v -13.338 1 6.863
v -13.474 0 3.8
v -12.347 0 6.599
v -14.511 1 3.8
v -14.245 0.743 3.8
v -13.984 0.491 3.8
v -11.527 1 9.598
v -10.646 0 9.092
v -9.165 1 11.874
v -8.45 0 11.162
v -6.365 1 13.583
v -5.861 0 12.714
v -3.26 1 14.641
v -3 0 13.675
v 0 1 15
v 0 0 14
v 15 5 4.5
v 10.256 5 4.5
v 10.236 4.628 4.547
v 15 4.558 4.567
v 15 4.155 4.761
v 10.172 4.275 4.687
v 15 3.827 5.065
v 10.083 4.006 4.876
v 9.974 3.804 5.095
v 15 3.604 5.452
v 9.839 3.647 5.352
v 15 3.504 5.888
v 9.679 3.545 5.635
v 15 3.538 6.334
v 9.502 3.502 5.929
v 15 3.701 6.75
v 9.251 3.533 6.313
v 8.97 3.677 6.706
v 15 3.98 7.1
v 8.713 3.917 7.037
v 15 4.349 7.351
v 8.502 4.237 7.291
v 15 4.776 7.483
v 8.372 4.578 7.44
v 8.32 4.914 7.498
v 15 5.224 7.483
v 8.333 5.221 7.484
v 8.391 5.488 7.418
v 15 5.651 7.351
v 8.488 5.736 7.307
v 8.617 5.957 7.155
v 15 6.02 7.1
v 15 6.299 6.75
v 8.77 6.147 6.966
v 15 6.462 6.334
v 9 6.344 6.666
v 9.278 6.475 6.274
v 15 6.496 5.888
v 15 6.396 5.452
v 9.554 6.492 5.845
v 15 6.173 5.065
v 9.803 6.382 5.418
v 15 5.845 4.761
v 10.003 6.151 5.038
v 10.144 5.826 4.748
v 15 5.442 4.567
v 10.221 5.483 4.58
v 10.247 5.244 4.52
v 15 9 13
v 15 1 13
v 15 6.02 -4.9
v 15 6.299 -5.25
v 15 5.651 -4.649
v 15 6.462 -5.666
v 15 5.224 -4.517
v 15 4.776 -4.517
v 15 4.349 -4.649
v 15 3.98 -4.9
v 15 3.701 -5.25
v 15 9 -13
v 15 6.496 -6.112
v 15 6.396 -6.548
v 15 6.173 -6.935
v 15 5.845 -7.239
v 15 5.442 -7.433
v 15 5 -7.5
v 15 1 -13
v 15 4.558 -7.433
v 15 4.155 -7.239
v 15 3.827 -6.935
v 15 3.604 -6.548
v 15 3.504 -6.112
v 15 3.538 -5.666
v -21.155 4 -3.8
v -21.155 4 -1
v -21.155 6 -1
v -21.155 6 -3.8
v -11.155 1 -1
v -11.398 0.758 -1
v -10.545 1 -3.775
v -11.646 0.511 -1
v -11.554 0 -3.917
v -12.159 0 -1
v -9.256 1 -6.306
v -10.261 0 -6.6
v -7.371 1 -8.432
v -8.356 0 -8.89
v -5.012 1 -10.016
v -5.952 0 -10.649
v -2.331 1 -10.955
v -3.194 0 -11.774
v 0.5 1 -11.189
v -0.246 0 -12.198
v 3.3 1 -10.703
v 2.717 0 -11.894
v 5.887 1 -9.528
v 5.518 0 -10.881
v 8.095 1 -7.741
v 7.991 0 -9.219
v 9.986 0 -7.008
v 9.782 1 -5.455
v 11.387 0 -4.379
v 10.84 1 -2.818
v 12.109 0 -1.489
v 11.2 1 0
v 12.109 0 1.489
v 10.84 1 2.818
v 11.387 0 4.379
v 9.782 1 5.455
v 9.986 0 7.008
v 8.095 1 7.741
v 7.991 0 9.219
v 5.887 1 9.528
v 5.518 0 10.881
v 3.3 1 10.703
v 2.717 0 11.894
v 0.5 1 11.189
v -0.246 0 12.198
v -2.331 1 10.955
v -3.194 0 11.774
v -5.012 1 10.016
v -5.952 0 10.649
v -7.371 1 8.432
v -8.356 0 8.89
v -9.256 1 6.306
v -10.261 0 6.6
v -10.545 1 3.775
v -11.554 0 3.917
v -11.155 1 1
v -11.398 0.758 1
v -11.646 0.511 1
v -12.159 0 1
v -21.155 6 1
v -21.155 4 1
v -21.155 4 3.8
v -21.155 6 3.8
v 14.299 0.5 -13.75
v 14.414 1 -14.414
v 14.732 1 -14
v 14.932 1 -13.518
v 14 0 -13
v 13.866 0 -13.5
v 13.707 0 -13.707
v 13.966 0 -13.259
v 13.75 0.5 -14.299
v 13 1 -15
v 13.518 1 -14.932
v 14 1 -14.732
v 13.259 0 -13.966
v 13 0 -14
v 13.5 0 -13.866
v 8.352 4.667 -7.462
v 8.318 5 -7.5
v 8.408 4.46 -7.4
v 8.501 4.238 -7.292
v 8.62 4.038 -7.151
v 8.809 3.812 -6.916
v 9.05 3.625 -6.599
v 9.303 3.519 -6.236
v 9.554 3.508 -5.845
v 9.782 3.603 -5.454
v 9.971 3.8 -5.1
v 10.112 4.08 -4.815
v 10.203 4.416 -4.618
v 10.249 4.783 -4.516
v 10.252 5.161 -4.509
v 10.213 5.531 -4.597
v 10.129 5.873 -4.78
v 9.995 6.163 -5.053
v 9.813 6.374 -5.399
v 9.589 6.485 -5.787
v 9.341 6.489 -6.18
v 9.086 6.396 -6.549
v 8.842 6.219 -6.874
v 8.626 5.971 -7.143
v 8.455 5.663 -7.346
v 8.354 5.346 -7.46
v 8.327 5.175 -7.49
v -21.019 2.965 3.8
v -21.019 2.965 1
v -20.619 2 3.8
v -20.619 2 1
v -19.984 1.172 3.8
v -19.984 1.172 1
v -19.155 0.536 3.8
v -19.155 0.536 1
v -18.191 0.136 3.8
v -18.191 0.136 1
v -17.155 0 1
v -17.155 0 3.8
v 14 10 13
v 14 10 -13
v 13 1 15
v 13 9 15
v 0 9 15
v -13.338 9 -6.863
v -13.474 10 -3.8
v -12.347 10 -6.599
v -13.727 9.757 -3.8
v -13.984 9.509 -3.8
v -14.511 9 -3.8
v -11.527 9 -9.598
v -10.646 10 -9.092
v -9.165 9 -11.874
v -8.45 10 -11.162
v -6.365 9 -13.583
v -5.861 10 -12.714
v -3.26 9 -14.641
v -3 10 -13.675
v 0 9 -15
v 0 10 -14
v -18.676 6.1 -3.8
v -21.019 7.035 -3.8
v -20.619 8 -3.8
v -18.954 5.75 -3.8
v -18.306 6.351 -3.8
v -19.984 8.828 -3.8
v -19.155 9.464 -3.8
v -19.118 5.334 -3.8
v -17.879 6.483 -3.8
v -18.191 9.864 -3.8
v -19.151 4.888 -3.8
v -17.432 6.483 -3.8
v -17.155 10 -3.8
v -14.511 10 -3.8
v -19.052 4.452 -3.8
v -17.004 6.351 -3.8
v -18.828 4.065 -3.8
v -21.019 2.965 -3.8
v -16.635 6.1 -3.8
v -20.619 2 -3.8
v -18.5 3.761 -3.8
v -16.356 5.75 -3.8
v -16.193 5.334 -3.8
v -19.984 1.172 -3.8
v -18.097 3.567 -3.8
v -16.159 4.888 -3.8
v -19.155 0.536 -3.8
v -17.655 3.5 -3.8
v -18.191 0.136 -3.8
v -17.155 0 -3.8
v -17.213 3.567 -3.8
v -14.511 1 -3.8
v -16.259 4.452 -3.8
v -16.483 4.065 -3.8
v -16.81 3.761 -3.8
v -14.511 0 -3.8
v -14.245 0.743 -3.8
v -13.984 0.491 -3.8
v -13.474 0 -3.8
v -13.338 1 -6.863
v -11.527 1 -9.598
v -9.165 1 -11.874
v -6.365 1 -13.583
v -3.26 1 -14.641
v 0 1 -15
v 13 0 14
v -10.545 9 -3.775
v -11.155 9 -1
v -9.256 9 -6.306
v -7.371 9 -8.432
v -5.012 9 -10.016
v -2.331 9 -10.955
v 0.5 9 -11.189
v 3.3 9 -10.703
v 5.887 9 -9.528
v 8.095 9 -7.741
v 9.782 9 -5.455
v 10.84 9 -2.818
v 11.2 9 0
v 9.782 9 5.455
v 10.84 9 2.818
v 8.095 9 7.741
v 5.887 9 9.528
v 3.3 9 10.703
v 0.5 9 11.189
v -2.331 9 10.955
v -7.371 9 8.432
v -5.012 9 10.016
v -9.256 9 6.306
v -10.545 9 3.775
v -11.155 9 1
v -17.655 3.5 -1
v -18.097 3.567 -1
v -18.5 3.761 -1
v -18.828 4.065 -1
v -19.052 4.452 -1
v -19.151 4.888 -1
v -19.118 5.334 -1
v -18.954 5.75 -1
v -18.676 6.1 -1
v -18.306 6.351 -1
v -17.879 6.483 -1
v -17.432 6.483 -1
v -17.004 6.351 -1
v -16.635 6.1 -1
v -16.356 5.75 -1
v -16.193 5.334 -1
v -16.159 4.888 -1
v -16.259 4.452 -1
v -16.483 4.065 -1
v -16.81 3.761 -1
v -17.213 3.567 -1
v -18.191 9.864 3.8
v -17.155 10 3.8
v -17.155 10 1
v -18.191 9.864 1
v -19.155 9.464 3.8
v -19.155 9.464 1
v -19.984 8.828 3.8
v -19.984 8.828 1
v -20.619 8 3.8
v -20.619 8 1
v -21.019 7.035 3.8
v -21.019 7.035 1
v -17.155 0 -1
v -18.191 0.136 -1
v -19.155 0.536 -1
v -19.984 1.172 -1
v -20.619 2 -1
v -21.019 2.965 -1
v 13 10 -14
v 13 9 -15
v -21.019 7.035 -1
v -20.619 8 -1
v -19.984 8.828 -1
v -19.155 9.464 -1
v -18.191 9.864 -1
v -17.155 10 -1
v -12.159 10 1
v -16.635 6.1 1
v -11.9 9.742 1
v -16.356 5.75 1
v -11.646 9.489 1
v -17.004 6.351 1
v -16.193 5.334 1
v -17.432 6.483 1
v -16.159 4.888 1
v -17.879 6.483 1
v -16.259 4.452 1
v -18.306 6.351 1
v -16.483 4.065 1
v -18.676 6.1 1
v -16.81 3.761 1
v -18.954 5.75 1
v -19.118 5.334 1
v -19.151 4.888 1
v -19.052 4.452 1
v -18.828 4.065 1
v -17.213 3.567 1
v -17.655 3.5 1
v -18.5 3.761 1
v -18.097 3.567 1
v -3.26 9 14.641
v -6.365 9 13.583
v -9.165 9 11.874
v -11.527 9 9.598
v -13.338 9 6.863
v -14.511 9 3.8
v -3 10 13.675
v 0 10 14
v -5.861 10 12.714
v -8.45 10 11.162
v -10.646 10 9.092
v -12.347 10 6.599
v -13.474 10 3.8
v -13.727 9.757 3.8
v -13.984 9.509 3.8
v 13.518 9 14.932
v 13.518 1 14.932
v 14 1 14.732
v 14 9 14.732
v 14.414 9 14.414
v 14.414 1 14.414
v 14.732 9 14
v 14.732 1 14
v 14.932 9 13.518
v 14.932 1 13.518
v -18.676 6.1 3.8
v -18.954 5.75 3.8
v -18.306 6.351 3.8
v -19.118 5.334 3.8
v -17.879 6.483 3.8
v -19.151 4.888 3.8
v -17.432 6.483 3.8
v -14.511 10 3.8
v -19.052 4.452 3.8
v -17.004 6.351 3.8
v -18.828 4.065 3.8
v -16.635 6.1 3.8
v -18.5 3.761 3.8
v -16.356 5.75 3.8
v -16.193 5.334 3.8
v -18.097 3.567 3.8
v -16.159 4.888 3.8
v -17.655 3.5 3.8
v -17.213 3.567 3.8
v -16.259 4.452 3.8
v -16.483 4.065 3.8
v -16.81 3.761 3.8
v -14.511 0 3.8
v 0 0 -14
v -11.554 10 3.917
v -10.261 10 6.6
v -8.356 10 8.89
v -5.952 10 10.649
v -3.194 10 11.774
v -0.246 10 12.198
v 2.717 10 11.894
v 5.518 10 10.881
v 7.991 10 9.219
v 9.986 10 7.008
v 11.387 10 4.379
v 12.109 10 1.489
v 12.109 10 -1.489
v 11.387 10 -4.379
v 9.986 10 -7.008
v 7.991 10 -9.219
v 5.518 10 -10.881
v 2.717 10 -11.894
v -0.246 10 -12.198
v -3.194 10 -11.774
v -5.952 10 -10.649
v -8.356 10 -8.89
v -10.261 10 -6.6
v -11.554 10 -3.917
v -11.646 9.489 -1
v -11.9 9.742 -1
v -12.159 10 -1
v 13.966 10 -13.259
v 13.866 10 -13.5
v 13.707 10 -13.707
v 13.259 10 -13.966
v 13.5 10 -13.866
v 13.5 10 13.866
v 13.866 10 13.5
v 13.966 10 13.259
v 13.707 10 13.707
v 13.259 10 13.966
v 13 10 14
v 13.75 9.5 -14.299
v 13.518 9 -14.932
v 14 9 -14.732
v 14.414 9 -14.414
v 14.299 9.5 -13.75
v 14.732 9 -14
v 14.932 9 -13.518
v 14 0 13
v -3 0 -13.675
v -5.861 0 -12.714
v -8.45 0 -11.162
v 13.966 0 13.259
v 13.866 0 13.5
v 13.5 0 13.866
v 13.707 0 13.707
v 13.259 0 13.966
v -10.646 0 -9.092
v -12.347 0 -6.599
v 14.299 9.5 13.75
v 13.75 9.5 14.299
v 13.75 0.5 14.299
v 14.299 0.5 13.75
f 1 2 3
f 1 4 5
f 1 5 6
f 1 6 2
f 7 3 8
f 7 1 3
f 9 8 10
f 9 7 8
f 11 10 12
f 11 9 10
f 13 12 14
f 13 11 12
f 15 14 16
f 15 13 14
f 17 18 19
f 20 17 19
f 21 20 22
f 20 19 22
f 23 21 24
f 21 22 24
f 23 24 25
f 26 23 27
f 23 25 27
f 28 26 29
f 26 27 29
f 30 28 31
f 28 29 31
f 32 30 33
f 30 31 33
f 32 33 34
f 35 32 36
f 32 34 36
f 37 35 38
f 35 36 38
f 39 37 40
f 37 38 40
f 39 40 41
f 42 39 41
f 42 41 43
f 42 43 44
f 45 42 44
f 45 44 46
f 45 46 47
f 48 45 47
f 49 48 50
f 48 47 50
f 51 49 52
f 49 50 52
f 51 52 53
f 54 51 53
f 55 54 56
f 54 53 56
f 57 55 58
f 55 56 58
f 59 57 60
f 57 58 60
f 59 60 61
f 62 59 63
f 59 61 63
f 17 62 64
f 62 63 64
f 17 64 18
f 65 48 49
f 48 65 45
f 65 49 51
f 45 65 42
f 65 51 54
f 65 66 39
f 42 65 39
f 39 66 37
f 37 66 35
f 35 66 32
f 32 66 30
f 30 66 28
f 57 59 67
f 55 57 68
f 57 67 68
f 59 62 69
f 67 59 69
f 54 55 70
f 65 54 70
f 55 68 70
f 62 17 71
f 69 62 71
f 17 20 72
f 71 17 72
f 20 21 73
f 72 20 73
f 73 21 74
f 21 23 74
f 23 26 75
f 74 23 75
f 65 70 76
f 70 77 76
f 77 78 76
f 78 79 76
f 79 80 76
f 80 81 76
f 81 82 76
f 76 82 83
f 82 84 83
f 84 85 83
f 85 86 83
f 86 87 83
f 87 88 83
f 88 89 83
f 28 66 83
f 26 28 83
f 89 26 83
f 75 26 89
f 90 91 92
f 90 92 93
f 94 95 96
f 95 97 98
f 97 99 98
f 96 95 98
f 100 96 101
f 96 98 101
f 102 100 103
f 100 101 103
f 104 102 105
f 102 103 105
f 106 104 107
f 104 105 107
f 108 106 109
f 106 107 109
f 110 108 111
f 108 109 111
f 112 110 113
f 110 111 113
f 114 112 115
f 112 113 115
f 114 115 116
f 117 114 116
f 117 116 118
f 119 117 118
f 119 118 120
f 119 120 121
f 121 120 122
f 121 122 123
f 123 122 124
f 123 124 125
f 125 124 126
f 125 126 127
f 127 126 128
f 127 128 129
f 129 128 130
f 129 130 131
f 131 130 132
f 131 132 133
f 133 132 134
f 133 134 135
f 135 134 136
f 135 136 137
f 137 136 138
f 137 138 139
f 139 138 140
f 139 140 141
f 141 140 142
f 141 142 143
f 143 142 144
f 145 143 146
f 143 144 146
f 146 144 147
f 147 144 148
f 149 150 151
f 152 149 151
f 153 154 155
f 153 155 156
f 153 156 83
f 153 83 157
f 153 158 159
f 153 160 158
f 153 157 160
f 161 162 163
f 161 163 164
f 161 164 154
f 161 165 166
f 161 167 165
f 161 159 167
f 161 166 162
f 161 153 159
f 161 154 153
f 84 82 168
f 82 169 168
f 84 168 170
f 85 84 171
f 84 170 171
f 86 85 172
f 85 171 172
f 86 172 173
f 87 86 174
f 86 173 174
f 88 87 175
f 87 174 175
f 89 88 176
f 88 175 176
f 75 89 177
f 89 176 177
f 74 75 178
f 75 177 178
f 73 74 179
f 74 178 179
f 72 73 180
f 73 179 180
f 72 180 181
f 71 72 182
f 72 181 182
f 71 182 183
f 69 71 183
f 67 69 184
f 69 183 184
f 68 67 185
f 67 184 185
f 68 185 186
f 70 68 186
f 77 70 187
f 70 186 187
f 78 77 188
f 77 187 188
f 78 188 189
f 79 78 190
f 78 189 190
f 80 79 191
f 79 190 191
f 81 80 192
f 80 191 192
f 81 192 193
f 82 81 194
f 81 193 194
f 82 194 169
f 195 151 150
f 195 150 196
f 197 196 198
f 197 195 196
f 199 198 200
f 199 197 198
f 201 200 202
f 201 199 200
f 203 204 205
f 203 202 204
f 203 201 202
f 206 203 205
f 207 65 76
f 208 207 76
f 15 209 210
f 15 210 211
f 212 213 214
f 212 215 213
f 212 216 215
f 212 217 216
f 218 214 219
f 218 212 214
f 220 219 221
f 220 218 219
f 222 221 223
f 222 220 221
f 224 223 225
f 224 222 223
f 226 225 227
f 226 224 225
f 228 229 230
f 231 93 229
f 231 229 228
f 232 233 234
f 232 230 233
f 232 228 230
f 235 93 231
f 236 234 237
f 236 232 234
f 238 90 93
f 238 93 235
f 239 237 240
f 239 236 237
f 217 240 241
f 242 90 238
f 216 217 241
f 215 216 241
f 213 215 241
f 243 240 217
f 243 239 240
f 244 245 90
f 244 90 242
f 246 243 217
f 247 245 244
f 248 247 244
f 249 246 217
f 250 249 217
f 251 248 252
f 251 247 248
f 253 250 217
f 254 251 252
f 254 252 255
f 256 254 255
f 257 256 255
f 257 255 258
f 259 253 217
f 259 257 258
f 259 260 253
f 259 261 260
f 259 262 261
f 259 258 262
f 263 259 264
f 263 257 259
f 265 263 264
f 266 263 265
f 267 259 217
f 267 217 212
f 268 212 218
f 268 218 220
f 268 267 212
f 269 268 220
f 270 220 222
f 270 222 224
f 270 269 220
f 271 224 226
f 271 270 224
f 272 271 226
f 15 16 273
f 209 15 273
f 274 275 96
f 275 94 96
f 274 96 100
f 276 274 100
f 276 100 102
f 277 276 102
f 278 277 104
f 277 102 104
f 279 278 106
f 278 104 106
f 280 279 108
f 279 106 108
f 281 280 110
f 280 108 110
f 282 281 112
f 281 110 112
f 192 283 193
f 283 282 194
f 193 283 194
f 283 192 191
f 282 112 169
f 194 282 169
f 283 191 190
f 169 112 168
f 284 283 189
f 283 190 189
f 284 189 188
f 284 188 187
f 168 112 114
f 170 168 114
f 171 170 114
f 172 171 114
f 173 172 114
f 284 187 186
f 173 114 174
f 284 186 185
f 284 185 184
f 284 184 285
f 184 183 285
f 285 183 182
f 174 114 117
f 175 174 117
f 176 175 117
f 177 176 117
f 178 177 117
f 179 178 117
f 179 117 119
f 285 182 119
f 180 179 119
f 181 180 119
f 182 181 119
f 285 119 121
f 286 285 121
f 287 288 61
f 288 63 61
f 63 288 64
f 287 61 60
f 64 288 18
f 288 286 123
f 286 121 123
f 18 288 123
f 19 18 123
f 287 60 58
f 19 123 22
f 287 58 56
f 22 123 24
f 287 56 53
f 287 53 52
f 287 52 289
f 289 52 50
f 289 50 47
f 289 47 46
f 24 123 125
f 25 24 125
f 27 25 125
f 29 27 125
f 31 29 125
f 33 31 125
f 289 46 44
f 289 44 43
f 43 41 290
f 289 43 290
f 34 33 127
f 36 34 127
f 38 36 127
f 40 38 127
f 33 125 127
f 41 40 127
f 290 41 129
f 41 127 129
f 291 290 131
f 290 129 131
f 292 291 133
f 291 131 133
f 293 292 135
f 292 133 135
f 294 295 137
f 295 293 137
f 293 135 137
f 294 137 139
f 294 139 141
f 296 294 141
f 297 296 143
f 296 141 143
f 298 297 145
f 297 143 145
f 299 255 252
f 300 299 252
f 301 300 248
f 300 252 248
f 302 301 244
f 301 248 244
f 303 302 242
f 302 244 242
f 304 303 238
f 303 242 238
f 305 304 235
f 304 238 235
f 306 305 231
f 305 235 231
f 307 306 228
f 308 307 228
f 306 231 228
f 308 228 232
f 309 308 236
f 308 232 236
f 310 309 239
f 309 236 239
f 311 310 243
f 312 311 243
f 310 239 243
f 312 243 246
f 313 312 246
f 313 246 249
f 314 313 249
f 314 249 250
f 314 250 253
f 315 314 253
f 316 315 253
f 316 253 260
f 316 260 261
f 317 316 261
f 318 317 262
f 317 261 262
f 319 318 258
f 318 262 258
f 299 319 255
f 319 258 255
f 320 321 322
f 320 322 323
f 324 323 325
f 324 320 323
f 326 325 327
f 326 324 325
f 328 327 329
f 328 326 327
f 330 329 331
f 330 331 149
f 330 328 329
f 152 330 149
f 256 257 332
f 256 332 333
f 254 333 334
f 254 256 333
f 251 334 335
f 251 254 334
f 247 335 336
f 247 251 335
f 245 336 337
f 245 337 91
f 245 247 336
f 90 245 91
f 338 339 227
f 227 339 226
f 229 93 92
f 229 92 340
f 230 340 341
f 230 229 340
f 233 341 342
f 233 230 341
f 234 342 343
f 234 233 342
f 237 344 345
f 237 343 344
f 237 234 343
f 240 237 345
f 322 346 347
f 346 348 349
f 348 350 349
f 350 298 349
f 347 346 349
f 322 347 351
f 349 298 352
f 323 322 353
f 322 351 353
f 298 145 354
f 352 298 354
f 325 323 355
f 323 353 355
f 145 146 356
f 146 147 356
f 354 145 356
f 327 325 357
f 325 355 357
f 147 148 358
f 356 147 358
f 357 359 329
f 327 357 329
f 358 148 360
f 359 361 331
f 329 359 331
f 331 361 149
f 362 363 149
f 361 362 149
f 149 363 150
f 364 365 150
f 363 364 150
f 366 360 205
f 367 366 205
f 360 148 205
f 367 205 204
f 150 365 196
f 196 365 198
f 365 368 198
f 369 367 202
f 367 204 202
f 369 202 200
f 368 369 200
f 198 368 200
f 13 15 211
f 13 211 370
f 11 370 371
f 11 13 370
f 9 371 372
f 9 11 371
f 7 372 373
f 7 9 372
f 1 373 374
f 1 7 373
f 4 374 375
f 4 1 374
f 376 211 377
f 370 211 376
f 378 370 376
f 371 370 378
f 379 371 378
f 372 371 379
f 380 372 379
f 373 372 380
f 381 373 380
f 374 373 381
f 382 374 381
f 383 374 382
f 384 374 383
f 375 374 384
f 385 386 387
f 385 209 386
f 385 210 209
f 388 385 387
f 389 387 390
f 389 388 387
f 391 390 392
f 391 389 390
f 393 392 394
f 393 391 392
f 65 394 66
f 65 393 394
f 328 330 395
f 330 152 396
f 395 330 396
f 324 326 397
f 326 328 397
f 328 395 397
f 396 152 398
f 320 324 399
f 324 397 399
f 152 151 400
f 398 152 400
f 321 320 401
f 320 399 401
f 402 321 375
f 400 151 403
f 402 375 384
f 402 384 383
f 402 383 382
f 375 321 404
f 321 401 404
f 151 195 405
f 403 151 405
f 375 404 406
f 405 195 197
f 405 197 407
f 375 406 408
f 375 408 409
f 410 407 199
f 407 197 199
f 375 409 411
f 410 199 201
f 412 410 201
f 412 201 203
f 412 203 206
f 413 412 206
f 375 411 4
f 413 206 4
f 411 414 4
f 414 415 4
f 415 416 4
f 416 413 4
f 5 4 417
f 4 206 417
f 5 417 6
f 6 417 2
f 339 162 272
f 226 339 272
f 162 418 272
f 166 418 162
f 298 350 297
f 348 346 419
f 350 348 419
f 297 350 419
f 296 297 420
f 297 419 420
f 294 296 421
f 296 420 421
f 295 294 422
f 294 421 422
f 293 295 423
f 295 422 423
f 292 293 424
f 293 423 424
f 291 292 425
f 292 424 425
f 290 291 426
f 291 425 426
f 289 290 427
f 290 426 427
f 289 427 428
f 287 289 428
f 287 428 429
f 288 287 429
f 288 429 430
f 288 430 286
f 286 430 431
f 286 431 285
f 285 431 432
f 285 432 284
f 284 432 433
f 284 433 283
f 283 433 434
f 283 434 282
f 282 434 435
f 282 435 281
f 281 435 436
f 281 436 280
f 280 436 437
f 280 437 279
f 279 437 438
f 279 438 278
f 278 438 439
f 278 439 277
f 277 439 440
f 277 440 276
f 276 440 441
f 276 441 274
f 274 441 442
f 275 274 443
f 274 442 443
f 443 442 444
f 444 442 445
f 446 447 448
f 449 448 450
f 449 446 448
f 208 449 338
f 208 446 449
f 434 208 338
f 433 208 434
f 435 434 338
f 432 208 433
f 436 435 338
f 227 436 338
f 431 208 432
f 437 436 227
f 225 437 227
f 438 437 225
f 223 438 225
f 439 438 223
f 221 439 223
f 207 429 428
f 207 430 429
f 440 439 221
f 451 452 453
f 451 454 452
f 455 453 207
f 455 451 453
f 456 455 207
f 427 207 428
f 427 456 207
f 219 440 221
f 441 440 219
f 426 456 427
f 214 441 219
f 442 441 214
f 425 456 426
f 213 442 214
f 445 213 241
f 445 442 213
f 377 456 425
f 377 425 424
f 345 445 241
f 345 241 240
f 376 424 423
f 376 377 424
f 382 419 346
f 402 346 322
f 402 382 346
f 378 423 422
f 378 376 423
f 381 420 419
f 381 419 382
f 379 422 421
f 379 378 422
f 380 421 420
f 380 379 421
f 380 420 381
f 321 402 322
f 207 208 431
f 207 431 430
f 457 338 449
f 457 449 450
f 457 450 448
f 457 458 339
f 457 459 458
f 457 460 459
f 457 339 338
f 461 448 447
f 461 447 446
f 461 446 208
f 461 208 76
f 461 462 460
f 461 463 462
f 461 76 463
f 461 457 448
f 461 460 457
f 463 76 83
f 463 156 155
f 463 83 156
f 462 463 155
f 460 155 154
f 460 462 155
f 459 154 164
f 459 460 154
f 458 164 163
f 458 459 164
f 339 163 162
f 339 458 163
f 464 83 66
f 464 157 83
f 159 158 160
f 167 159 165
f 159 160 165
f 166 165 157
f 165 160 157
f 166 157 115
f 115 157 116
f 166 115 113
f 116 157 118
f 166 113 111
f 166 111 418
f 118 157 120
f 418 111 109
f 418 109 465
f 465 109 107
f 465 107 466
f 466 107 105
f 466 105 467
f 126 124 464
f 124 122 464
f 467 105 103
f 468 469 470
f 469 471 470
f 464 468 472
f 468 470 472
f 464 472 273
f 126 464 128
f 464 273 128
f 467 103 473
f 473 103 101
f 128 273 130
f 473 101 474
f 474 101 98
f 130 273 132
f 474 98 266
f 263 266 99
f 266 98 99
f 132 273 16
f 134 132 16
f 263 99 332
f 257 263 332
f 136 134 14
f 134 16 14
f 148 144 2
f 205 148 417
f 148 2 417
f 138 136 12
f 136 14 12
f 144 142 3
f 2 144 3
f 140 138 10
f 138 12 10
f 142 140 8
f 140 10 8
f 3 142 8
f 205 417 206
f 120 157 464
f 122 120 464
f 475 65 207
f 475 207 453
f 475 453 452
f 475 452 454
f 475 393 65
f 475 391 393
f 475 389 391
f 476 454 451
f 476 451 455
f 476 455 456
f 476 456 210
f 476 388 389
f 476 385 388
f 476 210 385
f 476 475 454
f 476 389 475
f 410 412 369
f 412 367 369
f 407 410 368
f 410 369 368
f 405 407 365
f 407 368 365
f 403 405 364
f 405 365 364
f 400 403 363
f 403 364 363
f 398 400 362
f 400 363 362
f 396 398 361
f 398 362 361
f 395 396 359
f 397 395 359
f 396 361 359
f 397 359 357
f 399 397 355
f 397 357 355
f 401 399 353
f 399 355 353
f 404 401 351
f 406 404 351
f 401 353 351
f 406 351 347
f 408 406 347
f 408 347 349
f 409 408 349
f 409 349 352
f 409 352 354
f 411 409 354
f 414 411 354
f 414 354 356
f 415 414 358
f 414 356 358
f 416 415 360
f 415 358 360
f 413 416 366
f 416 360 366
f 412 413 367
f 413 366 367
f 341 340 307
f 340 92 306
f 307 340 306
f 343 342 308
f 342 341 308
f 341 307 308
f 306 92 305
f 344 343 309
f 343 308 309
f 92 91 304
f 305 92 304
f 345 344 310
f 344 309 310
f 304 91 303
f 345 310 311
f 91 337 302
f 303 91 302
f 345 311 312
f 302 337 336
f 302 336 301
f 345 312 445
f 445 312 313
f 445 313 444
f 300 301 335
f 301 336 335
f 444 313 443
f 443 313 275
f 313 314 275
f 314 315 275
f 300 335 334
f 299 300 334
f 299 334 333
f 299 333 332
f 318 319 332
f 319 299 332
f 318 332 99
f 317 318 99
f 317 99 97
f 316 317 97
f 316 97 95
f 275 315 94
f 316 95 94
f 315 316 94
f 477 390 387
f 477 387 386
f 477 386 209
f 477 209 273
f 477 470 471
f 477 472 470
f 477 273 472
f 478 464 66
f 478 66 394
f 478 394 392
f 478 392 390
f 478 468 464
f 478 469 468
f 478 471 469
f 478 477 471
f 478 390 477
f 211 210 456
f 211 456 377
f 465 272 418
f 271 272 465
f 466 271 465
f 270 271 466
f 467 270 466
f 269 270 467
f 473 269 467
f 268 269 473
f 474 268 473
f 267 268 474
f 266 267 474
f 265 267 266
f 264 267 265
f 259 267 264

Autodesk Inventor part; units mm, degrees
ref_plane "YZ Plane" through (0, 0, 0) normal (1, 0, 0) x (0, 1, 0)
ref_plane "XZ Plane" through (0, 0, 0) normal (0, 1, 0) x (-1, 0, 0)
ref_plane "XY Plane" through (0, 0, 0) normal (0, 0, 1) x (1, 0, 0)
sketch "Эскиз1" plane through (0, 0, 0) normal (0, 1, 0) x (-1, 0, 0)
  arc A0 (11.1553, 1) -> (11.1553, -1) centre (0, 0) ccw
  line L0 (-15, 15) -> (-15, -15)
  line L1 (-15, 15) -> (0, 15)
  line L2 (-15, -15) -> (0, -15)
  line L3 (11.1553, 1) -> (14.9666, 1)
  line L4 (14.9666, -1) -> (11.1553, -1)
  arc A1 (0, -15) -> (14.5107, -3.8) centre (0, 0) ccw
  arc A2 (14.5107, 3.8) -> (0, 15) centre (0, 0) ccw
  line L5 (11.1553, -1) -> (21.1553, -1)
  line L6 (21.1553, -1) -> (21.1553, -3.8)
  line L7 (21.1553, -3.8) -> (14.5107, -3.8)
  line L8 (11.1553, 1) -> (21.1553, 1)
  line L9 (21.1553, 1) -> (21.1553, 3.8)
  line L10 (21.1553, 3.8) -> (14.5107, 3.8)
  point P0 (15, 0)
  dimension "d0" = 22.4
  dimension "d2" = 30
  dimension "d5" = 2.8
  dimension "d6" = 2.8
extrude "Выдавливание1" add sketch "Эскиз1" along normal blind 10
sketch "Эскиз2" plane through (15, 0, 15) normal (1, 0, 0) x (0, 0, -1)
  line L0 (0, 0) -> (30, 0) projected
  line L1 (30, 0) -> (30, 10) projected
  line L2 (0, 10) -> (30, 10) projected
  line L3 (0, 0) -> (0, 10) projected
  line L4 (0, 5) -> (30, 5) construction
  line L5 (15, 10) -> (15, 0) construction
  point P0 (21, 5)
  point P1 (9, 5)
  dimension "d10" = 6
  dimension "d11" = 6
hole "Отверстие1" at (15, 5, -6) at (15, 5, 6) direction (-1, 0, 0) diameter 3 depth 8 tip angle 118
fillet "Сопряжение1" radius 4 4 edges at (-21.1553, 10, 2.4) (-21.1553, 10, -2.4) (-21.1553, 0, 2.4) (-21.1553, 0, -2.4)
sketch "Эскиз3" plane through (-14.5107, 0, 3.8) normal (0, 0, 1) x (1, 0, 0)
  arc A0 (-6.6446, 4) -> (-2.6446, 0) centre (-2.6446, 4) ccw projected
  line L0 (-2.6446, 0) -> (0, 0) projected
  line L1 (0, 0) -> (0, 10) projected
  line L2 (-2.6446, 10) -> (0, 10) projected
  arc A1 (-2.6446, 10) -> (-6.6446, 6) centre (-2.6446, 6) ccw projected
  line L3 (-6.6446, 4) -> (-6.6446, 6) projected
  line L4 (-6.6446, 5) -> (-3.1446, 5) construction
  point P0 (14.5107, 0)
  dimension "d20" = 3.5
hole "Отверстие2" at (-17.6553, 5, 3.8) direction (0, 0, -1) diameter 3 depth 8 tip angle 118
fillet "Сопряжение2" radius 2 2 edges at (15, 5, 15) (15, 5, -15)
chamfer "Фаска1" distance 1 angle 45 16 edges at (11.2, 10, 0) (11.2, 0, 0) (6.5, 10, 15) (14.4142, 10, 14.4142) (15, 10, 0) (14.4142, 10, -14.4142) (6.5, 10, -15) (-9.1652, 10, -11.8743) (-9.1652, 10, 11.8743) (6.5, 0, 15) (14.4142, 0, 14.4142) (15, 0, 0) (14.4142, 0, -14.4142) (6.5, 0, -15) (-9.1652, 0, -11.8743) (-9.1652, 0, 11.8743)
properties part number "ScreenMount"
